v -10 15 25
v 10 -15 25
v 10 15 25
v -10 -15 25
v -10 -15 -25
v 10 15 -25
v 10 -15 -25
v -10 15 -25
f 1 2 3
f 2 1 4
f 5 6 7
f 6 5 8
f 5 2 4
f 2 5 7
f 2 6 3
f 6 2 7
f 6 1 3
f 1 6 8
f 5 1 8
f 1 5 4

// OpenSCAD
// a centred cube
//cube(10,true);
//cube([20,30,50],true);
cube( [ 20 , 30 , 50 ] , true ) ;
